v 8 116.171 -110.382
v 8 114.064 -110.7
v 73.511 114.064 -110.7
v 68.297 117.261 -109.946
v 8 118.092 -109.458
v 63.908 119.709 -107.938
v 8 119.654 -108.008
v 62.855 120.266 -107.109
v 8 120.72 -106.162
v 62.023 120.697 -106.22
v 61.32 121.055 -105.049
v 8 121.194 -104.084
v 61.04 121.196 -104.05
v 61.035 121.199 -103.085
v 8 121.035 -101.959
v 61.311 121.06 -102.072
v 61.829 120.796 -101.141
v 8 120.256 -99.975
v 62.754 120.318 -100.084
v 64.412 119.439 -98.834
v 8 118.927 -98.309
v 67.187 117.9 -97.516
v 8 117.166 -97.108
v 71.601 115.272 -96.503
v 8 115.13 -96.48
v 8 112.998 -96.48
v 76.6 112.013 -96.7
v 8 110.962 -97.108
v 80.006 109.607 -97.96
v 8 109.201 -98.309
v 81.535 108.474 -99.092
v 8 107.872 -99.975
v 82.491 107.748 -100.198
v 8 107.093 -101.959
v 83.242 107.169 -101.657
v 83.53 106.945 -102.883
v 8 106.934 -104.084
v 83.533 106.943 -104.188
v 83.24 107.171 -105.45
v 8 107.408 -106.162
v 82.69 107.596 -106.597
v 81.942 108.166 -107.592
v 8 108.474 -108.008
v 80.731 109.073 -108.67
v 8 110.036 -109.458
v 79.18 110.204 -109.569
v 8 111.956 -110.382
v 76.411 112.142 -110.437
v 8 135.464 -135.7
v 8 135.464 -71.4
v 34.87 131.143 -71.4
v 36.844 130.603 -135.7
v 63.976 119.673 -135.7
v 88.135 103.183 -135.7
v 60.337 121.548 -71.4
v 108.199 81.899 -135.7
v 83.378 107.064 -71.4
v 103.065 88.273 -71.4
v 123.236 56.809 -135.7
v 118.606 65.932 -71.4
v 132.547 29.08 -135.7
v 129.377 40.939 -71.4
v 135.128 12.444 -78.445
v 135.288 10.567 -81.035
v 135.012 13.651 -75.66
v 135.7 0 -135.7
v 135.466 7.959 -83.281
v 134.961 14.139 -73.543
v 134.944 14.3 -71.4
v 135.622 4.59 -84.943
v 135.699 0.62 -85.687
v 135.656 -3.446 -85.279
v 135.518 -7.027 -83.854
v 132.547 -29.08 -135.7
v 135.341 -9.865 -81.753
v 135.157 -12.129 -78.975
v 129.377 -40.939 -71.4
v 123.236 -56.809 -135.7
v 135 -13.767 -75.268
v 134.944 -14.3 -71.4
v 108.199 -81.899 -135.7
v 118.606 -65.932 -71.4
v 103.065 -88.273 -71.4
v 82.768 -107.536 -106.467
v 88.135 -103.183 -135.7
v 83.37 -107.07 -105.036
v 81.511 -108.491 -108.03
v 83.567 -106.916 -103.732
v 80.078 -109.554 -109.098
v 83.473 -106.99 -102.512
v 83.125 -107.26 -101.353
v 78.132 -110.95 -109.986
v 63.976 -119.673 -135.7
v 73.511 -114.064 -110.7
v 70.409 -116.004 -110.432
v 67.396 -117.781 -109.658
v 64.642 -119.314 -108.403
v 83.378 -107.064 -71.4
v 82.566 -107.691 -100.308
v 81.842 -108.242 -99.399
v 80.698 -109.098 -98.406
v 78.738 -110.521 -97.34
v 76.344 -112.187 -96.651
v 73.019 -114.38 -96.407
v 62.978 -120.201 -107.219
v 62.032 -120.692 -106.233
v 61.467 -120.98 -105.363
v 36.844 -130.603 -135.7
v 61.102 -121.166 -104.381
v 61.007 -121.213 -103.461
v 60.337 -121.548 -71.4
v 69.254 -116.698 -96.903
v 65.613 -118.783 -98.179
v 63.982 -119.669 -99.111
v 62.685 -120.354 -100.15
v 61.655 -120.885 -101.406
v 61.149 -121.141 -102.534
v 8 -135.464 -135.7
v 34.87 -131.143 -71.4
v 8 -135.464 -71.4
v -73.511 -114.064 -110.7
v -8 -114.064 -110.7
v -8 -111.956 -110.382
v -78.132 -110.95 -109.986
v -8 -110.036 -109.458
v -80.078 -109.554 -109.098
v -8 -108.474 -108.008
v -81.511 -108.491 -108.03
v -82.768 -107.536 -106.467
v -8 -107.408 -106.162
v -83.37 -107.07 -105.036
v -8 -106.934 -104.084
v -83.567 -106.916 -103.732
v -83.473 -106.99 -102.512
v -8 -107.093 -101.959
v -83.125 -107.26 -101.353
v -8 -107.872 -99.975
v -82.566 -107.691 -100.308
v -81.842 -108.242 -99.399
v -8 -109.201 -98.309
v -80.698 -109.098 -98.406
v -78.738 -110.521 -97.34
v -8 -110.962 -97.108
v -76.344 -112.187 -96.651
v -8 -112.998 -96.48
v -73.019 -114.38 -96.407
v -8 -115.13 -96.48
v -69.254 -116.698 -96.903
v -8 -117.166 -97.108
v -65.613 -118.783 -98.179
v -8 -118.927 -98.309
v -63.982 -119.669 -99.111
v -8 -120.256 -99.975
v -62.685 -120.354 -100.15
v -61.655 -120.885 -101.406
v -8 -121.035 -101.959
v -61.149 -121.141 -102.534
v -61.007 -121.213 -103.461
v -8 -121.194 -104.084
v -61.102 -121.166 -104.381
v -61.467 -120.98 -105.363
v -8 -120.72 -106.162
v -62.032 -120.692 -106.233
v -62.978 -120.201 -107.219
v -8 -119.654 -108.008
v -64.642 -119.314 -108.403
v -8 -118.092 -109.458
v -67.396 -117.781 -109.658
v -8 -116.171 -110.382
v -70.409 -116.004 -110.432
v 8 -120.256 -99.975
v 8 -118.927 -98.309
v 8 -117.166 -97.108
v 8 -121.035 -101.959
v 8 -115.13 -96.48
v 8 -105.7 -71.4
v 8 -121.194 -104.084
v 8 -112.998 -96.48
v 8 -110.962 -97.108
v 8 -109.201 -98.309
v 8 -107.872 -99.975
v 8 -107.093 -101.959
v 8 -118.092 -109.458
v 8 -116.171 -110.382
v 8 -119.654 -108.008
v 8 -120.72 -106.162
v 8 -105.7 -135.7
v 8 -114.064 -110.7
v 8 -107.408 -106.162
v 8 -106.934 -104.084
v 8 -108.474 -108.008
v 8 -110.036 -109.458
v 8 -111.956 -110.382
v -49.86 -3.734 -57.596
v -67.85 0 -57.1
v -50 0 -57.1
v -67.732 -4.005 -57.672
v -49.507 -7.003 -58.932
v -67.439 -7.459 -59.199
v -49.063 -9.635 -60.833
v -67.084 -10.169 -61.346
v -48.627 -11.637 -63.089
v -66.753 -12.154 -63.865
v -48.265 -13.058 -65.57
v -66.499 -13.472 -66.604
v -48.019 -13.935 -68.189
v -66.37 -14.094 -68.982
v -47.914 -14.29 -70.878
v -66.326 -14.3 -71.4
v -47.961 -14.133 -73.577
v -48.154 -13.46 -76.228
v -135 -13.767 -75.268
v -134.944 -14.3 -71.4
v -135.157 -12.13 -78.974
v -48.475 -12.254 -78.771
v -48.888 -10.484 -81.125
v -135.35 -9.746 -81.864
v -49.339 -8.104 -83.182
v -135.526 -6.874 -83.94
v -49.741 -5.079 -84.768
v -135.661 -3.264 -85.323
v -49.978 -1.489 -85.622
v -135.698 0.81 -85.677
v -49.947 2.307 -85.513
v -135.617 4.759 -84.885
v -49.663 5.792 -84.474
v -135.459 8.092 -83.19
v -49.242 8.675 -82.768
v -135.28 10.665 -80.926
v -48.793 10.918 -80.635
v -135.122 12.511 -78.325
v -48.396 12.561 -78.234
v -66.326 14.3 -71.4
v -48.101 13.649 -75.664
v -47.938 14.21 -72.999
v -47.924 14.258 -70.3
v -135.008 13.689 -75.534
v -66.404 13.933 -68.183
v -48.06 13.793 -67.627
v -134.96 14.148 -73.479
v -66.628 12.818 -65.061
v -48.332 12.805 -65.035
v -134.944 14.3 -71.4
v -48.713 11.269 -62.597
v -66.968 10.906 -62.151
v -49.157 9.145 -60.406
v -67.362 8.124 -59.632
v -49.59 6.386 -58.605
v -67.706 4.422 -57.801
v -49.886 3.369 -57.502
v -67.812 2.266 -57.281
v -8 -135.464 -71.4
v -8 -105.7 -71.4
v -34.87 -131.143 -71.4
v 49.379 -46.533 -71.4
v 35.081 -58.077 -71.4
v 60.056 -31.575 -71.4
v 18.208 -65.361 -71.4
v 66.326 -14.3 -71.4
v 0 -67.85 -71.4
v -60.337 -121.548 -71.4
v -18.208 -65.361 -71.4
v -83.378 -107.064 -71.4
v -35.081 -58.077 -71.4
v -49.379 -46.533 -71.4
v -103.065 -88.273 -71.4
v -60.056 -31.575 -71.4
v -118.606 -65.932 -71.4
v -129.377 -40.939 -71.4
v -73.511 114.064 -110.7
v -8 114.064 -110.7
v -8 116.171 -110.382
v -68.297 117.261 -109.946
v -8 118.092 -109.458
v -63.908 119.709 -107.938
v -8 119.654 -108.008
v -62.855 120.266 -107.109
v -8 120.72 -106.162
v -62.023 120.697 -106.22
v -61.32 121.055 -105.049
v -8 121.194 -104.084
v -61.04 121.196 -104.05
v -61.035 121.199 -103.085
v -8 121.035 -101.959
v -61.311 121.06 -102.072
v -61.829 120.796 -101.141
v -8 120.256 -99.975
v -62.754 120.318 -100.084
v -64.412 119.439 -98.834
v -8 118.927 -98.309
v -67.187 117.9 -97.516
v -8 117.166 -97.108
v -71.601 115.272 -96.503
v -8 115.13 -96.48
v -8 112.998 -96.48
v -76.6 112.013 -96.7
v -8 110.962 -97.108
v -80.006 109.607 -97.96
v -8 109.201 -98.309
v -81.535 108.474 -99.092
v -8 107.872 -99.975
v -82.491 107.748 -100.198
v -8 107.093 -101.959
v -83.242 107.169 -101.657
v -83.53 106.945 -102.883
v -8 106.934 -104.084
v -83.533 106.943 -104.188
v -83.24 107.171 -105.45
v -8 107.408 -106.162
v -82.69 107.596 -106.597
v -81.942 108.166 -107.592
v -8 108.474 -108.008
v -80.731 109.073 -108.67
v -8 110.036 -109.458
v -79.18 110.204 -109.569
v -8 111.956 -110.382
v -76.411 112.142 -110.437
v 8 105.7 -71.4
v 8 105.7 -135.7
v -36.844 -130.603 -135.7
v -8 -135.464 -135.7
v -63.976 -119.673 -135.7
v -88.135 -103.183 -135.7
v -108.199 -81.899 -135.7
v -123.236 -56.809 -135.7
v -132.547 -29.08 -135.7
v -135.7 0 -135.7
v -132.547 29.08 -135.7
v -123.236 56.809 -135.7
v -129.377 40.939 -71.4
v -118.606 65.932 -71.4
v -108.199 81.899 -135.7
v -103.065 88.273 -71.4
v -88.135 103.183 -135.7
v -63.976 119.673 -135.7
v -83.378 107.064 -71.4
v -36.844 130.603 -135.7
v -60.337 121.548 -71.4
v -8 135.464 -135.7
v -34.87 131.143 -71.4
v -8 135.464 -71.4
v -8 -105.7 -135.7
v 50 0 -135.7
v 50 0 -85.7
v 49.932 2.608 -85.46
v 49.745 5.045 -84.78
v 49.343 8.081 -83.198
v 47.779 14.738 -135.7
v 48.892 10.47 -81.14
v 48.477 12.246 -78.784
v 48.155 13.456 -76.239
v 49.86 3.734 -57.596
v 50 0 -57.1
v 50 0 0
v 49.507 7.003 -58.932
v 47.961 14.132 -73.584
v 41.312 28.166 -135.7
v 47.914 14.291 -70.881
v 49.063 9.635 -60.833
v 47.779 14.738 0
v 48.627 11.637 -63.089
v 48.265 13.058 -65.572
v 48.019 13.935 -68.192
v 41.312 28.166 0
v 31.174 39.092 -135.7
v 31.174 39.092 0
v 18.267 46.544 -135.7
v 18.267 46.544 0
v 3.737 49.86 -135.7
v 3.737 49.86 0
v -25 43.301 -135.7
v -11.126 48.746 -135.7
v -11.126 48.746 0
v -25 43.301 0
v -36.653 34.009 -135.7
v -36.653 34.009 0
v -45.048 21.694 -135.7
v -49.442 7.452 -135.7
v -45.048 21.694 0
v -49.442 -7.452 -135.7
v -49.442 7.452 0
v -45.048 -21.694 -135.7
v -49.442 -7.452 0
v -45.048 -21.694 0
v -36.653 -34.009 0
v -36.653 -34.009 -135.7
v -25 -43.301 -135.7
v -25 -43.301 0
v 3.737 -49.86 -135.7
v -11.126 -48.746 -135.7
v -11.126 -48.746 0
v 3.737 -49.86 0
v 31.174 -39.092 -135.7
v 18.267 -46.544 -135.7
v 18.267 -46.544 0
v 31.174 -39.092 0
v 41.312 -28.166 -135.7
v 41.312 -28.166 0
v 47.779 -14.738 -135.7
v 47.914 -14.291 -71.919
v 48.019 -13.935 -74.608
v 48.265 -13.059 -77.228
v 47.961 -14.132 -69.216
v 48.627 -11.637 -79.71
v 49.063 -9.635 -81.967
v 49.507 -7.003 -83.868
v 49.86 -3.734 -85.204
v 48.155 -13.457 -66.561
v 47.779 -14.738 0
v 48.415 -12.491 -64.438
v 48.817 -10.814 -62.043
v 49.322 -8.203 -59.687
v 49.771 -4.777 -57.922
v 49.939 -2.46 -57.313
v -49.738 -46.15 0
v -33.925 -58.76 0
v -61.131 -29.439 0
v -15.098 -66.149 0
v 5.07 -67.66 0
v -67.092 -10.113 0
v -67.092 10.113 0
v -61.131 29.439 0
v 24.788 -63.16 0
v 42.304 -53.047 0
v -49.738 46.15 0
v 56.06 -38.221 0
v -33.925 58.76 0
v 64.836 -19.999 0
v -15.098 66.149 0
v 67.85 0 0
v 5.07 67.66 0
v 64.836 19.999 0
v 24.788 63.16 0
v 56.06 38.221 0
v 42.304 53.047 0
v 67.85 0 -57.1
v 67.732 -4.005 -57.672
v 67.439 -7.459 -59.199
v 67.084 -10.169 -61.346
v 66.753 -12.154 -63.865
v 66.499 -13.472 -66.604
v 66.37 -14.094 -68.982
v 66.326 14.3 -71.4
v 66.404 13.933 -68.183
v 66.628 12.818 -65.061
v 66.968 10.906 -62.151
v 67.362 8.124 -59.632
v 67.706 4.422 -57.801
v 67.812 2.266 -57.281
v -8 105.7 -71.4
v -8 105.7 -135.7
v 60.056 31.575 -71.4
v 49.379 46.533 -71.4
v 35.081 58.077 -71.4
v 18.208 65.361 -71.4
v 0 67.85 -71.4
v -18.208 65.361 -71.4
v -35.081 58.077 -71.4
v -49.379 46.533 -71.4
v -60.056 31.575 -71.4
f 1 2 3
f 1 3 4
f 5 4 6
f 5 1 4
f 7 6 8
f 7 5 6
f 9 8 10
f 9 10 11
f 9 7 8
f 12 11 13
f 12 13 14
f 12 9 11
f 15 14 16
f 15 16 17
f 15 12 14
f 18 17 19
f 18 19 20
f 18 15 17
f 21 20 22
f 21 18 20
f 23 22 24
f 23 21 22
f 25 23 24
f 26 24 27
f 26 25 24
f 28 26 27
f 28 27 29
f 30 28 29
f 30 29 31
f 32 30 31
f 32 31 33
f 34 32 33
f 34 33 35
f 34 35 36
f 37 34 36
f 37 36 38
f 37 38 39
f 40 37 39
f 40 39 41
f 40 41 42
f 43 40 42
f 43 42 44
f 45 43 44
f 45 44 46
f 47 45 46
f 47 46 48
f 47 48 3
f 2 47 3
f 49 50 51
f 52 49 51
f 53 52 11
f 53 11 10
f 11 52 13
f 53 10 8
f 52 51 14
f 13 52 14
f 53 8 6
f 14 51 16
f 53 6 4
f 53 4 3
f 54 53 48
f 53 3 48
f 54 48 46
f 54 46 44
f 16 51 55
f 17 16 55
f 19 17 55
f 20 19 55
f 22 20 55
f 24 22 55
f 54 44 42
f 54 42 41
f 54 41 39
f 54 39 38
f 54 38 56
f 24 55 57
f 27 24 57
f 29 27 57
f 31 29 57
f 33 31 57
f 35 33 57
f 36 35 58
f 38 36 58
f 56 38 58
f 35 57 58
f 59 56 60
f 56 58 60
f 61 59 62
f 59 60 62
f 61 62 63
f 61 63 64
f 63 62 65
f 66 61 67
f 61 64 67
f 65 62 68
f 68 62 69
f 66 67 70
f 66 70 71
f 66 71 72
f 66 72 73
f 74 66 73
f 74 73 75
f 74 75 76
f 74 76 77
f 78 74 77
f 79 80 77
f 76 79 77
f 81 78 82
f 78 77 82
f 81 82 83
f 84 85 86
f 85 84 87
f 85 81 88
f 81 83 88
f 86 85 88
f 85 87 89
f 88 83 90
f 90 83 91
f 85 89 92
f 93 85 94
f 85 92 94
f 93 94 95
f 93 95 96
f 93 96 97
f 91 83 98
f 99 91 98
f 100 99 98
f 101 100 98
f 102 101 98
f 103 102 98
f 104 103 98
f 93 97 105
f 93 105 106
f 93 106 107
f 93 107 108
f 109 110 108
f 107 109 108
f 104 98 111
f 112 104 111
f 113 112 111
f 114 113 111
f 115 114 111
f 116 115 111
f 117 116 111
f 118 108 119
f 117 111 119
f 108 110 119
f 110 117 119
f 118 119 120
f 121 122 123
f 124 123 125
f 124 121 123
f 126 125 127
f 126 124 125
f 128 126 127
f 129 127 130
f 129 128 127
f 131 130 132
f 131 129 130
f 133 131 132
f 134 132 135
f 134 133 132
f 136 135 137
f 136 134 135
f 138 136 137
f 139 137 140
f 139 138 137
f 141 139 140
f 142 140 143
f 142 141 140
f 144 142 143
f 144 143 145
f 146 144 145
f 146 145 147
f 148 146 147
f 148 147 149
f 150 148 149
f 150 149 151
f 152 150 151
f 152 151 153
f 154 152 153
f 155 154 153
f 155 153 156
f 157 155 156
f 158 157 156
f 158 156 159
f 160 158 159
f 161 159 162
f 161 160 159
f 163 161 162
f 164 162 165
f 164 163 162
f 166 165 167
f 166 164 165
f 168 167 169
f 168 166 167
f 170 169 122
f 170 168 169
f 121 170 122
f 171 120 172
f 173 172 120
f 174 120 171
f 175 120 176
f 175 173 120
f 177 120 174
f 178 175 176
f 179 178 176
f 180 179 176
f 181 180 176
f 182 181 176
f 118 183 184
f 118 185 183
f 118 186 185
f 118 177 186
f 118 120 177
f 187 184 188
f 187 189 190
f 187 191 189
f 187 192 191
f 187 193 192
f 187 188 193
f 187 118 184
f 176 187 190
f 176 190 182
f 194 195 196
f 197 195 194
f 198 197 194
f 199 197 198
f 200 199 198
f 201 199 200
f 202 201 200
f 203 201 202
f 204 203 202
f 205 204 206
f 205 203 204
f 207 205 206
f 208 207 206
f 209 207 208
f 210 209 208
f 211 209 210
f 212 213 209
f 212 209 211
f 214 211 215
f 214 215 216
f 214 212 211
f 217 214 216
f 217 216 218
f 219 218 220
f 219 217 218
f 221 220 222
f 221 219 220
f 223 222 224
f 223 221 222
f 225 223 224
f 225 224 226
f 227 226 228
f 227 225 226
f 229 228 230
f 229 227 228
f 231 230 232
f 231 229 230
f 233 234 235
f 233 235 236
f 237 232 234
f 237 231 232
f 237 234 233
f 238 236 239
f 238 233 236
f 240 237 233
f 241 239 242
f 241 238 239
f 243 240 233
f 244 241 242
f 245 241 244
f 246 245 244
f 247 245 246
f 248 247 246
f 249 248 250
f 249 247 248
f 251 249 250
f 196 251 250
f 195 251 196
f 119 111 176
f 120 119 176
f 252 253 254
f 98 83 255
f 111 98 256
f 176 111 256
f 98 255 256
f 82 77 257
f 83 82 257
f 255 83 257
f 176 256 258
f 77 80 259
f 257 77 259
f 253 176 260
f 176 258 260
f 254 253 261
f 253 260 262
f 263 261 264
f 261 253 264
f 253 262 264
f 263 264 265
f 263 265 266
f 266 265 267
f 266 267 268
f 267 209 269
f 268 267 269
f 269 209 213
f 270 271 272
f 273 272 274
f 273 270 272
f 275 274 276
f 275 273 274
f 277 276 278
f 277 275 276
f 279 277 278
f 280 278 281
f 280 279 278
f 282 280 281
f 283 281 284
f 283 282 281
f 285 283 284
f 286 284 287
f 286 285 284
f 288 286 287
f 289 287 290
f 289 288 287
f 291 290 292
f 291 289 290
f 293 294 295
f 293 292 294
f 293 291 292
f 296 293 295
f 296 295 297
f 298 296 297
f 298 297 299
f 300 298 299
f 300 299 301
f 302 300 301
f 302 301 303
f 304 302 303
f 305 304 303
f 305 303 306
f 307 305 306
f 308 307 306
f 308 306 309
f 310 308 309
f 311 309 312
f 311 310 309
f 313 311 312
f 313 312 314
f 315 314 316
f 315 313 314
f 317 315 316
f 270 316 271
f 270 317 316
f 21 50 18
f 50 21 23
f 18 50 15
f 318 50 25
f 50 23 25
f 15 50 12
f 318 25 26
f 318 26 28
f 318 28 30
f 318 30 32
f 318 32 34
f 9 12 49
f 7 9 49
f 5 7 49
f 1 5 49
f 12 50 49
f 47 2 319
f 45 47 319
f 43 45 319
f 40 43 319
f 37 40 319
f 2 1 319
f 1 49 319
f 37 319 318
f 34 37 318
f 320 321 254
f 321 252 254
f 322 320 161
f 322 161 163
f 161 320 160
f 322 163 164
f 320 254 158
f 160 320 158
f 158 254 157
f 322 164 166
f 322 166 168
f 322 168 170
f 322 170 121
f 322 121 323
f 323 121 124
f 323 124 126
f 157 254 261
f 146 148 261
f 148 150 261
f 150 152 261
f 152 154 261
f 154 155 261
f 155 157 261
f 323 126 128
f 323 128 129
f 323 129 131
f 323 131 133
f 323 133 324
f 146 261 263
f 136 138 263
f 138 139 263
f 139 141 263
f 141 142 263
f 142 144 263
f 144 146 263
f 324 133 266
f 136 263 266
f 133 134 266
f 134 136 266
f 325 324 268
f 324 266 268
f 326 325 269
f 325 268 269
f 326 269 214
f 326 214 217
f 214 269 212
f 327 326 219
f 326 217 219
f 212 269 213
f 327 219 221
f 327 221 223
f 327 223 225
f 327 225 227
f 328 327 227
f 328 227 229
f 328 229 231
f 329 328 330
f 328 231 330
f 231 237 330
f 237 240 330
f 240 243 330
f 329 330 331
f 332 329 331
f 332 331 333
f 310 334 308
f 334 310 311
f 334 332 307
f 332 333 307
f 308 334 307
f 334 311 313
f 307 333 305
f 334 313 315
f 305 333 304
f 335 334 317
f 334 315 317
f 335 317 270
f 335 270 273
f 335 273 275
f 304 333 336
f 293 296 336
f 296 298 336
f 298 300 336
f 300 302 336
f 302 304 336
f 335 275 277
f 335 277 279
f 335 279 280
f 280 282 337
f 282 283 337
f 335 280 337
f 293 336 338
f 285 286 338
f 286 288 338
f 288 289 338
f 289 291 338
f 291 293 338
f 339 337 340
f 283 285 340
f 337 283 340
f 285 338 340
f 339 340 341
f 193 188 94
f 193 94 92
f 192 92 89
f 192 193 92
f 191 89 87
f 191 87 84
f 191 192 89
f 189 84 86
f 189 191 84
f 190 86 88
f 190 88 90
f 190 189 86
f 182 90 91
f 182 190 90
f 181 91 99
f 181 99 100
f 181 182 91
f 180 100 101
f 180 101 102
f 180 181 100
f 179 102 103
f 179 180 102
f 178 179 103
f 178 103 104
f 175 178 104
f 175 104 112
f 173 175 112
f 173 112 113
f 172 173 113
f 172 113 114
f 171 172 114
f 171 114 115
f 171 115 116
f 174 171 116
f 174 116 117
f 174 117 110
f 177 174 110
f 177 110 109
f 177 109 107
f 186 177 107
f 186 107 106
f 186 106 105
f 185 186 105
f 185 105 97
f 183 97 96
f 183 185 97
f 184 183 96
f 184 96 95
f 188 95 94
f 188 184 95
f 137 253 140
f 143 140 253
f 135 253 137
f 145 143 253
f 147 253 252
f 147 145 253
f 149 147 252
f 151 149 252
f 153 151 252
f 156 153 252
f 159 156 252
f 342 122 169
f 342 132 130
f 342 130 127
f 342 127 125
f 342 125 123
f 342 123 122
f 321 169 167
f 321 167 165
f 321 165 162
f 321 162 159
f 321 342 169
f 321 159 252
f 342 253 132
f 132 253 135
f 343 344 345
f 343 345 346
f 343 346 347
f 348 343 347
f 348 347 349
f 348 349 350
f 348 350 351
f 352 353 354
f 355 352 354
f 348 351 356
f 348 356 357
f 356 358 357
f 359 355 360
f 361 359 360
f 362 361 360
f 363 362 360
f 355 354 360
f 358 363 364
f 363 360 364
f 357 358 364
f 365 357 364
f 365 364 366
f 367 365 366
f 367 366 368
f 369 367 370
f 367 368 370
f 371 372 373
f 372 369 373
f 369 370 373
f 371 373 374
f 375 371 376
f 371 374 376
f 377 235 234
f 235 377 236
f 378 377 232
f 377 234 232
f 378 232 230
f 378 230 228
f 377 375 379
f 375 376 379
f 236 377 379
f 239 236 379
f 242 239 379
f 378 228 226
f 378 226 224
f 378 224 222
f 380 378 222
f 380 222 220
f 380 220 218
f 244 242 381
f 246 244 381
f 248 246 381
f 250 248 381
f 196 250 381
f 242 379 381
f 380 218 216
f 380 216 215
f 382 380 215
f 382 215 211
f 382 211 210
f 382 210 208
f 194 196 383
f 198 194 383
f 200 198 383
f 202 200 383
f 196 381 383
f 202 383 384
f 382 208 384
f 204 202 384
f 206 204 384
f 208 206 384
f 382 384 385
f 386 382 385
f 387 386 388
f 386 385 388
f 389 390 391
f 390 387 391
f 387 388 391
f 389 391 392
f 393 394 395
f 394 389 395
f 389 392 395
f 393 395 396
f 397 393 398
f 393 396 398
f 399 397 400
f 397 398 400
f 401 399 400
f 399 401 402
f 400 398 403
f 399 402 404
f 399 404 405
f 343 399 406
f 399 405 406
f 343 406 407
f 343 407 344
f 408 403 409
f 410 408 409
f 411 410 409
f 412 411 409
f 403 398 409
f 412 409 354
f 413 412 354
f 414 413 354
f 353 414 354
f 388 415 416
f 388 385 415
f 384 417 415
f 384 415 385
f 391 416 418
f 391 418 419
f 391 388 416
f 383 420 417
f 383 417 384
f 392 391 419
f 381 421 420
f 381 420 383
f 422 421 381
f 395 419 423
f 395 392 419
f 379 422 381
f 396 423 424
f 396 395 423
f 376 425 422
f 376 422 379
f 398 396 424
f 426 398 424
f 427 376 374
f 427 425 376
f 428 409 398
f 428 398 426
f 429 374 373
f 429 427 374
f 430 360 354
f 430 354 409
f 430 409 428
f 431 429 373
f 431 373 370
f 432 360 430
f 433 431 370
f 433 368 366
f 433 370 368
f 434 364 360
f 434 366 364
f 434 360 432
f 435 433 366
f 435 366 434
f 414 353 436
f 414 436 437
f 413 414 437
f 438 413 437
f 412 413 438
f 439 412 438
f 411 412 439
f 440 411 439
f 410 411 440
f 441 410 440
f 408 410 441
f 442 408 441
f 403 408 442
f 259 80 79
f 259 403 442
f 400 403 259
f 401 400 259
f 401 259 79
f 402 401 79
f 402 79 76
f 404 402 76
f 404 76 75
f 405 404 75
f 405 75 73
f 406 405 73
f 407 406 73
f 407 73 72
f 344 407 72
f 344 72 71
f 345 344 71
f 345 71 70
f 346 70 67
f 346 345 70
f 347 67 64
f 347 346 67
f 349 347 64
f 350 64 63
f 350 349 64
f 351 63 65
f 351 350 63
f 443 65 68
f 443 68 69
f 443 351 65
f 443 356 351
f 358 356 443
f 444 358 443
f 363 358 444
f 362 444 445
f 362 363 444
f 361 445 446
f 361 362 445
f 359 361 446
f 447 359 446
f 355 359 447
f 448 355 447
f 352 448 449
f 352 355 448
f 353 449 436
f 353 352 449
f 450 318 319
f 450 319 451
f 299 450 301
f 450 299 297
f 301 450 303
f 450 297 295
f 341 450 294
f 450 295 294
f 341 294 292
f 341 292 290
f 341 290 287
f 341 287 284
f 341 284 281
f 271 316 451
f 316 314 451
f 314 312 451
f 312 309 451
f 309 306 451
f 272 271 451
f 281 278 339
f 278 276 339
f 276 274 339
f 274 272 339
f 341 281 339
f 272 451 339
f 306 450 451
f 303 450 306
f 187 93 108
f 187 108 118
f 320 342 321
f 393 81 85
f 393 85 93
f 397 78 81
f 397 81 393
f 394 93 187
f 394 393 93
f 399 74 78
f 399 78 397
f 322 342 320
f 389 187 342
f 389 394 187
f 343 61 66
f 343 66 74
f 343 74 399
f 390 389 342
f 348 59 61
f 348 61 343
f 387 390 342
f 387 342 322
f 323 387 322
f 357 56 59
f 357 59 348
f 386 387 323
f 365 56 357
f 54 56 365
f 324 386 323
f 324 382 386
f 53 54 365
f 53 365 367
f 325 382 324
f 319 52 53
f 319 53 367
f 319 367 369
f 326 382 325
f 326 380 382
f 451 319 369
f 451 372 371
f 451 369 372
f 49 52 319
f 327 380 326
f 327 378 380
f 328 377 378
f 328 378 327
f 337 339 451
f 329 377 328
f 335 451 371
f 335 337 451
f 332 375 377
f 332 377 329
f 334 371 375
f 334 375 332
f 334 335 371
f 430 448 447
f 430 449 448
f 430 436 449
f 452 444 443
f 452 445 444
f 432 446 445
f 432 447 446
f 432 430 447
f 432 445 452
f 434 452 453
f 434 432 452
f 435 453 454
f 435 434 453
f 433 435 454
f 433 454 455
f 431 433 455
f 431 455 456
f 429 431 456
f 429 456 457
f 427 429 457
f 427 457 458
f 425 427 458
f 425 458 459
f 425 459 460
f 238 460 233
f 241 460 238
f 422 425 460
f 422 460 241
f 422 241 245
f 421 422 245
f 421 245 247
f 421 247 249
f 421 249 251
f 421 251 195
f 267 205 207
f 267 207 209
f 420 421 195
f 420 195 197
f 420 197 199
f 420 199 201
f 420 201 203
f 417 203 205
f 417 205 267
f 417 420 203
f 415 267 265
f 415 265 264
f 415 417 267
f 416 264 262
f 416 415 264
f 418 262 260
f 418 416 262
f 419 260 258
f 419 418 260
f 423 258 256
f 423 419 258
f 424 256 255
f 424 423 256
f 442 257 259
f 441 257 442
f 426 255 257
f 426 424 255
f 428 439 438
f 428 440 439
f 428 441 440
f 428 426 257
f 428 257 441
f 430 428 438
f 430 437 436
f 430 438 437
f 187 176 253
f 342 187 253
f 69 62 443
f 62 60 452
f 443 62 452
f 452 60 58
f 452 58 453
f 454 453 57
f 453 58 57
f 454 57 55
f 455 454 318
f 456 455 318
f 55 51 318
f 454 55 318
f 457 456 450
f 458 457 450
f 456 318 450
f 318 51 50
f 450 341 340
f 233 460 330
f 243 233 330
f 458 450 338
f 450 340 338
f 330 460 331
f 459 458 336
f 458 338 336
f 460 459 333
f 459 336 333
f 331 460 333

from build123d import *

# Parameters (mm, degrees)
ESQUISSE1_R                  = 67.85
ESQUISSE1_R_2                = 50
BOSS_EXTRU_1_DEPTH           = 71.4
ESQUISSE3_R                  = 135.7
ESQUISSE3_R_2                = 50
BOSS_EXTRU_2_DEPTH           = 64.3
ENL_V_MAT_EXTRU_1_DEPTH      = 236.039294587
ENL_V_MAT_EXTRU_1_DEPTH_BACK = 236.039294587
ESQUISSE4_R                  = 14.3
ENL_V_MAT_EXTRU_2_DEPTH      = 236.03929476
ENL_V_MAT_EXTRU_3_DEPTH      = 235.903107858
ENL_V_MAT_EXTRU_3_DEPTH_BACK = 235.903107858
ESQUISSE7_R                  = 7.15


with BuildPart() as part:
    # Esquisse1 → Boss.-Extru.1 (new body)
    with BuildSketch(Plane.XY):
        Circle(ESQUISSE1_R)
        Circle(ESQUISSE1_R_2, mode=Mode.SUBTRACT)
    extrude(amount=-BOSS_EXTRU_1_DEPTH)

    # Esquisse3 → Boss.-Extru.2 (add)
    with BuildSketch(Plane(origin=(0, 0, -71.4), x_dir=(-1, 0, 0), z_dir=(0, 0, -1))):
        Circle(ESQUISSE3_R)
        with Locations(Location((0, 0, 0), (0, 0, 180))):
            Circle(ESQUISSE3_R_2, mode=Mode.SUBTRACT)
    extrude(amount=BOSS_EXTRU_2_DEPTH)

    # Esquisse4 → Enlèv. mat.-Extru.1 (cut, two sides: drawn at the far end of the back side and taken through both)
    with BuildSketch(Plane(origin=(0, 0, 0), x_dir=(0, 0, -1), z_dir=(1, 0, 0)).offset(-ENL_V_MAT_EXTRU_1_DEPTH_BACK)):
        with Locations(Location((71.4, 0, 0), (0, 0, 180))):
            Circle(ESQUISSE4_R)
    extrude(amount=ENL_V_MAT_EXTRU_1_DEPTH + ENL_V_MAT_EXTRU_1_DEPTH_BACK, mode=Mode.SUBTRACT)

    # Esquisse6 → Enlèv. mat.-Extru.2 (cut, through all)
    with BuildSketch(Plane(origin=(0, 0, -135.7), x_dir=(-1, 0, 0), z_dir=(0, 0, -1))):
        with BuildLine():
            Line((-8, 105.7), (8, 105.7))
            Line((8, 105.7), (8, 135.463980452))
            ThreePointArc((8, 135.463980452), (0, 135.7), (-8, 135.463980452))
            Line((-8, 135.463980452), (-8, 105.7))
        make_face()
        with BuildLine():
            Line((8, -105.7), (8, -135.463980452))
            ThreePointArc((8, -135.463980452), (0, -135.7), (-8, -135.463980452))
            Line((-8, -135.463980452), (-8, -105.7))
            Line((-8, -105.7), (8, -105.7))
        make_face()
    extrude(amount=-ENL_V_MAT_EXTRU_2_DEPTH, mode=Mode.SUBTRACT)

    # Esquisse7 → Enlèv. mat.-Extru.3 (cut, two sides: drawn at the far end of the back side and taken through both)
    with BuildSketch(Plane(origin=(0, 0, 0), x_dir=(0, 0, -1), z_dir=(1, 0, 0)).offset(-ENL_V_MAT_EXTRU_3_DEPTH_BACK)):
        with Locations((103.55, 114.063980452)):
            Circle(ESQUISSE7_R)
        with Locations((103.55, -114.063980452)):
            Circle(ESQUISSE7_R)
    extrude(amount=ENL_V_MAT_EXTRU_3_DEPTH + ENL_V_MAT_EXTRU_3_DEPTH_BACK, mode=Mode.SUBTRACT)


solid = part.part
